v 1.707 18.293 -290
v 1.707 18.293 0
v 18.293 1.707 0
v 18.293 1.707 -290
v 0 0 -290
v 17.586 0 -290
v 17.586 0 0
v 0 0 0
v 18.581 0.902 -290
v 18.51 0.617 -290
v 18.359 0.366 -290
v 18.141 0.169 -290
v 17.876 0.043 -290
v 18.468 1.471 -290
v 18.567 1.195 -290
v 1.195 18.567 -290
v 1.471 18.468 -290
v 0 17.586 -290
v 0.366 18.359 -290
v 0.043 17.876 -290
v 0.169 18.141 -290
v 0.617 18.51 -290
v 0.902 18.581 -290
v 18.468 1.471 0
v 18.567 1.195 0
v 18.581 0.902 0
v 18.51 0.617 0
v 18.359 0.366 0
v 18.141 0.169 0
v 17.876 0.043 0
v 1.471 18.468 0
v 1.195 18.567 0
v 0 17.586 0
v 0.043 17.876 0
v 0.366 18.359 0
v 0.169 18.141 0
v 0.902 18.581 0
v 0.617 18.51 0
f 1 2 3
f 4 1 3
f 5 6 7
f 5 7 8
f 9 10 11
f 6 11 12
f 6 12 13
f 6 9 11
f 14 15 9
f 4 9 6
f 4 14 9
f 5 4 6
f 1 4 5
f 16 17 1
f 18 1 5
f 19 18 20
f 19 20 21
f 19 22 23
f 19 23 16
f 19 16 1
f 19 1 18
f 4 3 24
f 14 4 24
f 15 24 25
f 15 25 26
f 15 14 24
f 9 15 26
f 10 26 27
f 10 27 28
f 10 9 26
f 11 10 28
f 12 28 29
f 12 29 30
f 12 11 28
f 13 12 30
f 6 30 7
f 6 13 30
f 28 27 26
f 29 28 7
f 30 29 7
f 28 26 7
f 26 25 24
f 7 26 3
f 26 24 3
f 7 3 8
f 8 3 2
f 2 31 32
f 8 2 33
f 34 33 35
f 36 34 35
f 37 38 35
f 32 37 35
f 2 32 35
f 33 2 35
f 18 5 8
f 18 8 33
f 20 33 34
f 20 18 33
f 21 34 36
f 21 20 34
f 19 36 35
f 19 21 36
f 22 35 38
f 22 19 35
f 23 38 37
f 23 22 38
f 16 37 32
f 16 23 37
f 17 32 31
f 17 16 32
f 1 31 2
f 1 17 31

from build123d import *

# Parameters (mm, degrees)
EXTRUDE_1_DEPTH = 290
FILLET_1_R      = 1


with BuildPart() as part:
    # Эскиз1 → Бобышка-Вытянуть1 (new body)
    with BuildSketch(Plane.XY):
        Polygon((0, 0), (0, 20), (20, 0), align=None)
    extrude(amount=-EXTRUDE_1_DEPTH)

    # Скругление1
    fillet_1_edges = [part.edges().sort_by_distance(p)[0] for p in [
        (0, 20, -145),
        (20, 0, -145),
    ]]
    fillet(fillet_1_edges, radius=FILLET_1_R)


solid = part.part
